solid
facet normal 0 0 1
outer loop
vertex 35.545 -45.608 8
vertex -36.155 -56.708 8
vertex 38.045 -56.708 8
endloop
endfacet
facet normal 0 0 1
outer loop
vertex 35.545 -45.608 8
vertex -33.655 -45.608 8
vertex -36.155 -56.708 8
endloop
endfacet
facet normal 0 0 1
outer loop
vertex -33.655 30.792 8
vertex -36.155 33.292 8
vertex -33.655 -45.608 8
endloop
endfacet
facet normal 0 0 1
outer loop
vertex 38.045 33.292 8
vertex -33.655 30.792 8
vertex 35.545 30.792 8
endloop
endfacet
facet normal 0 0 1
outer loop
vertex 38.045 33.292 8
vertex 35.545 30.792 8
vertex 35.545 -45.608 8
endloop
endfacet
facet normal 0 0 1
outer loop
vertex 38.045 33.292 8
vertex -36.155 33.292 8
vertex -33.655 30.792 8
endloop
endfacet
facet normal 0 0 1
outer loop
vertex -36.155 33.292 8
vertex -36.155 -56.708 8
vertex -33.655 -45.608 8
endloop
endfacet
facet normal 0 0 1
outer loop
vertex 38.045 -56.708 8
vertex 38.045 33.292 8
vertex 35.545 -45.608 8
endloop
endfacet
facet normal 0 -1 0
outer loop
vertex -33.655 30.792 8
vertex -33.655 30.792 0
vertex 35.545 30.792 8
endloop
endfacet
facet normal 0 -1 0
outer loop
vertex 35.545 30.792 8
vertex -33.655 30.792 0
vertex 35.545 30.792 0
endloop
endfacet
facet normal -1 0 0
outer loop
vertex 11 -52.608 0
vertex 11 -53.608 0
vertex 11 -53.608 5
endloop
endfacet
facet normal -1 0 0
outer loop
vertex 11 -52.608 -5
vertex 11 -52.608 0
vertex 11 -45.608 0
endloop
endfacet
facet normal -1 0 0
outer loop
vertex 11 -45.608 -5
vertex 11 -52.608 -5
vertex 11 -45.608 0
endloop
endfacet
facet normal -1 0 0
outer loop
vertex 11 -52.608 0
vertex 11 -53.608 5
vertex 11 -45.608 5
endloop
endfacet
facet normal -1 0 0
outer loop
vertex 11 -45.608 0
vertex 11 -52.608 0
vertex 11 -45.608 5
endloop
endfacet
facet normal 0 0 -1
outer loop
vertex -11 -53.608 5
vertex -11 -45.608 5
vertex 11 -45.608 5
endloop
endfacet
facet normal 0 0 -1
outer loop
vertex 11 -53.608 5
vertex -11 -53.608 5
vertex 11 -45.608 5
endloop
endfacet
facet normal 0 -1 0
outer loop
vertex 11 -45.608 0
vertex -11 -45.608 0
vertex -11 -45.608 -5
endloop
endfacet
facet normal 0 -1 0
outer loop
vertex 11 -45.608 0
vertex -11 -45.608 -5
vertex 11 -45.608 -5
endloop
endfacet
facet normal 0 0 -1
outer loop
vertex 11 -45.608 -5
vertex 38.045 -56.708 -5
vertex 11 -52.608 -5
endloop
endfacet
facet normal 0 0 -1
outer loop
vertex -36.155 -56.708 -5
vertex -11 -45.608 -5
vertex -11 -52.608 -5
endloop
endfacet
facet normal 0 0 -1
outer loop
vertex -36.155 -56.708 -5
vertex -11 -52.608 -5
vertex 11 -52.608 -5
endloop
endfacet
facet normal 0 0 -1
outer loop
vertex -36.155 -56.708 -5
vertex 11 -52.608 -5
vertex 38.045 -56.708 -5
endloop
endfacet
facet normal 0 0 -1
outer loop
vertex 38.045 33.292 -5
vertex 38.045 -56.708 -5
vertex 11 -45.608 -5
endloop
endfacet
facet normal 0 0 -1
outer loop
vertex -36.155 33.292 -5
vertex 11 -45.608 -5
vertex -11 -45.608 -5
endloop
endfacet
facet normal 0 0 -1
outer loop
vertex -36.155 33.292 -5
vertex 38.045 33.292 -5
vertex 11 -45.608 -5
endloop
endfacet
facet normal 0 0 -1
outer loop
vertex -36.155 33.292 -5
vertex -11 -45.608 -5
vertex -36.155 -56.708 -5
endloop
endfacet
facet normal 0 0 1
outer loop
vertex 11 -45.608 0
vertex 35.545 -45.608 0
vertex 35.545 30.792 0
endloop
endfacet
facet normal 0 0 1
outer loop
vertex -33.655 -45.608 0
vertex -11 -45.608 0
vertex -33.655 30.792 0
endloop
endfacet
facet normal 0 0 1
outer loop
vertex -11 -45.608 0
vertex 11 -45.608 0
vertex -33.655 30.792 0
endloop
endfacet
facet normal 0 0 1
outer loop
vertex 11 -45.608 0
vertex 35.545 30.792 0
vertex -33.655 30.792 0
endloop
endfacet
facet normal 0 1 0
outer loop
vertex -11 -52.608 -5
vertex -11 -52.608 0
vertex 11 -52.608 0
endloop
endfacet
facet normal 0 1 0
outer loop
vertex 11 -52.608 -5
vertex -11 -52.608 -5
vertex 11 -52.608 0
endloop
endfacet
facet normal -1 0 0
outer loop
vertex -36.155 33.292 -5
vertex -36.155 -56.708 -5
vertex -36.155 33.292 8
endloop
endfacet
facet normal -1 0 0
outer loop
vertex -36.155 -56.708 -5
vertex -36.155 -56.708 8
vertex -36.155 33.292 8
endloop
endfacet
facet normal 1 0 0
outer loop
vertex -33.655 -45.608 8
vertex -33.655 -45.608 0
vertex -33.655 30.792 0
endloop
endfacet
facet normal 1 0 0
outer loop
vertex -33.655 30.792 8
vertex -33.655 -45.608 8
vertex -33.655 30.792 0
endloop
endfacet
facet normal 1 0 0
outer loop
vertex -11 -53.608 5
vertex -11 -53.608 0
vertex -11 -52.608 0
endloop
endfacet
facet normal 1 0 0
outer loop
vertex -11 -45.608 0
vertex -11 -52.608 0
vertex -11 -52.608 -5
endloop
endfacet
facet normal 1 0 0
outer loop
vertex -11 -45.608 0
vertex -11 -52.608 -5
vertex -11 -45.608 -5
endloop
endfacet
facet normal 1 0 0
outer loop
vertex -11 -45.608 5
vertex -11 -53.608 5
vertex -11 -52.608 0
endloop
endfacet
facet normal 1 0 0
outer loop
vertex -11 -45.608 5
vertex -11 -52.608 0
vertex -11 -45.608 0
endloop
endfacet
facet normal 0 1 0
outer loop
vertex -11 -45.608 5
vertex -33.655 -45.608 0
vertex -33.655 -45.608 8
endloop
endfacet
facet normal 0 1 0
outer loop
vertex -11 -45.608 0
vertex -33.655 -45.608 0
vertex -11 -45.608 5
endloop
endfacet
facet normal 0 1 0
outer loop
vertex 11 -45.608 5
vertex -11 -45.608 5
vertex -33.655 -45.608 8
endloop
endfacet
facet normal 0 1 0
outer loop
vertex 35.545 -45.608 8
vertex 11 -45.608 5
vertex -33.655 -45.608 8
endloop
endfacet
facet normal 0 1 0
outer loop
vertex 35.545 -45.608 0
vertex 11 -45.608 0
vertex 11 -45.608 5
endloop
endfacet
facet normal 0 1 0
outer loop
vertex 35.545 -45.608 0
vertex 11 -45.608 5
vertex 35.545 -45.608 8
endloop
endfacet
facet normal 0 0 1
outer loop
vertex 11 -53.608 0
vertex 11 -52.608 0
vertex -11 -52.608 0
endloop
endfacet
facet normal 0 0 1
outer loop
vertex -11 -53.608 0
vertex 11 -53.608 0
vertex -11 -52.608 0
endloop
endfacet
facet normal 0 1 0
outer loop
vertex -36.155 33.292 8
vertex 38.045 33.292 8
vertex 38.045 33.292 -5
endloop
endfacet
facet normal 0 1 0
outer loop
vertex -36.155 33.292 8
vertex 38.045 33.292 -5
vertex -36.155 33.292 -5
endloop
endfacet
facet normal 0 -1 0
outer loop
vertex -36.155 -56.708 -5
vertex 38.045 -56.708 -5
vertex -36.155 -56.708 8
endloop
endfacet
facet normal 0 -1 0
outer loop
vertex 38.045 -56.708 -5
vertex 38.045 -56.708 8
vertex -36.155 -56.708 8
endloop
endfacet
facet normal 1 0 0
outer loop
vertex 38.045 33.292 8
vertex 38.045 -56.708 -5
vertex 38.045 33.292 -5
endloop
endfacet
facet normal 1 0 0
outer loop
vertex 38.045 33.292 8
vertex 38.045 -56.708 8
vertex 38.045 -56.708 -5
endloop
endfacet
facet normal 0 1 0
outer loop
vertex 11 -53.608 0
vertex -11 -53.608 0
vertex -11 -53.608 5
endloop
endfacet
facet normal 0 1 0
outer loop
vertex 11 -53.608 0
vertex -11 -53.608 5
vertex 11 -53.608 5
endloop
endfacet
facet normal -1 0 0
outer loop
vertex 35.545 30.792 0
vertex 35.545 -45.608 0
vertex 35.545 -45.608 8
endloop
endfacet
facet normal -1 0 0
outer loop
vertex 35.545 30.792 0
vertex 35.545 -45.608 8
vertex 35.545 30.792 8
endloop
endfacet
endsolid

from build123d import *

# Parameters (mm, degrees)
SKETCH2_W           = 74.2
SKETCH2_H           = 90
SKETCH2_W_2         = 69.2
SKETCH2_H_2         = 76.4
BOSS_EXTRUDE1_DEPTH = 8
SKETCH3_W           = 74.2
SKETCH3_H           = 90
BOSS_EXTRUDE2_DEPTH = 5
SKETCH5_W           = 22
SKETCH5_H           = 5
CUT_EXTRUDE1_DEPTH  = 8
SKETCH9_W           = 22
SKETCH9_H           = 7
CUT_EXTRUDE2_DEPTH  = 69.755085919


with BuildPart() as part:
    # Sketch2 → Boss-Extrude1 (new body)
    with BuildSketch(Plane.XY):
        with Locations((0.944957983, -11.708403361)):
            Rectangle(SKETCH2_W, SKETCH2_H)
        with Locations((0.944957983, -7.408403361)):
            Rectangle(SKETCH2_W_2, SKETCH2_H_2, mode=Mode.SUBTRACT)
    extrude(amount=BOSS_EXTRUDE1_DEPTH)

    # Sketch3 → Boss-Extrude2 (add)
    with BuildSketch(Plane(origin=(0, 0, 0), x_dir=(-1, 0, 0), z_dir=(0, 0, -1))):
        with Locations((-0.944957983, -11.708403361)):
            Rectangle(SKETCH3_W, SKETCH3_H)
    extrude(amount=BOSS_EXTRUDE2_DEPTH)

    # Sketch5 → Cut-Extrude1 (cut)
    with BuildSketch(Plane(origin=(0, -45.608403361, 0), x_dir=(1, 0, 0), z_dir=(0, 1, 0))):
        with Locations((0, -2.5)):
            Rectangle(SKETCH5_W, SKETCH5_H)
    extrude(amount=-CUT_EXTRUDE1_DEPTH, mode=Mode.SUBTRACT)

    # Sketch9 → Cut-Extrude2 (cut, through all)
    with BuildSketch(Plane.XY):
        with Locations((0, -49.108403361)):
            Rectangle(SKETCH9_W, SKETCH9_H)
    extrude(amount=-CUT_EXTRUDE2_DEPTH, mode=Mode.SUBTRACT)


solid = part.part
